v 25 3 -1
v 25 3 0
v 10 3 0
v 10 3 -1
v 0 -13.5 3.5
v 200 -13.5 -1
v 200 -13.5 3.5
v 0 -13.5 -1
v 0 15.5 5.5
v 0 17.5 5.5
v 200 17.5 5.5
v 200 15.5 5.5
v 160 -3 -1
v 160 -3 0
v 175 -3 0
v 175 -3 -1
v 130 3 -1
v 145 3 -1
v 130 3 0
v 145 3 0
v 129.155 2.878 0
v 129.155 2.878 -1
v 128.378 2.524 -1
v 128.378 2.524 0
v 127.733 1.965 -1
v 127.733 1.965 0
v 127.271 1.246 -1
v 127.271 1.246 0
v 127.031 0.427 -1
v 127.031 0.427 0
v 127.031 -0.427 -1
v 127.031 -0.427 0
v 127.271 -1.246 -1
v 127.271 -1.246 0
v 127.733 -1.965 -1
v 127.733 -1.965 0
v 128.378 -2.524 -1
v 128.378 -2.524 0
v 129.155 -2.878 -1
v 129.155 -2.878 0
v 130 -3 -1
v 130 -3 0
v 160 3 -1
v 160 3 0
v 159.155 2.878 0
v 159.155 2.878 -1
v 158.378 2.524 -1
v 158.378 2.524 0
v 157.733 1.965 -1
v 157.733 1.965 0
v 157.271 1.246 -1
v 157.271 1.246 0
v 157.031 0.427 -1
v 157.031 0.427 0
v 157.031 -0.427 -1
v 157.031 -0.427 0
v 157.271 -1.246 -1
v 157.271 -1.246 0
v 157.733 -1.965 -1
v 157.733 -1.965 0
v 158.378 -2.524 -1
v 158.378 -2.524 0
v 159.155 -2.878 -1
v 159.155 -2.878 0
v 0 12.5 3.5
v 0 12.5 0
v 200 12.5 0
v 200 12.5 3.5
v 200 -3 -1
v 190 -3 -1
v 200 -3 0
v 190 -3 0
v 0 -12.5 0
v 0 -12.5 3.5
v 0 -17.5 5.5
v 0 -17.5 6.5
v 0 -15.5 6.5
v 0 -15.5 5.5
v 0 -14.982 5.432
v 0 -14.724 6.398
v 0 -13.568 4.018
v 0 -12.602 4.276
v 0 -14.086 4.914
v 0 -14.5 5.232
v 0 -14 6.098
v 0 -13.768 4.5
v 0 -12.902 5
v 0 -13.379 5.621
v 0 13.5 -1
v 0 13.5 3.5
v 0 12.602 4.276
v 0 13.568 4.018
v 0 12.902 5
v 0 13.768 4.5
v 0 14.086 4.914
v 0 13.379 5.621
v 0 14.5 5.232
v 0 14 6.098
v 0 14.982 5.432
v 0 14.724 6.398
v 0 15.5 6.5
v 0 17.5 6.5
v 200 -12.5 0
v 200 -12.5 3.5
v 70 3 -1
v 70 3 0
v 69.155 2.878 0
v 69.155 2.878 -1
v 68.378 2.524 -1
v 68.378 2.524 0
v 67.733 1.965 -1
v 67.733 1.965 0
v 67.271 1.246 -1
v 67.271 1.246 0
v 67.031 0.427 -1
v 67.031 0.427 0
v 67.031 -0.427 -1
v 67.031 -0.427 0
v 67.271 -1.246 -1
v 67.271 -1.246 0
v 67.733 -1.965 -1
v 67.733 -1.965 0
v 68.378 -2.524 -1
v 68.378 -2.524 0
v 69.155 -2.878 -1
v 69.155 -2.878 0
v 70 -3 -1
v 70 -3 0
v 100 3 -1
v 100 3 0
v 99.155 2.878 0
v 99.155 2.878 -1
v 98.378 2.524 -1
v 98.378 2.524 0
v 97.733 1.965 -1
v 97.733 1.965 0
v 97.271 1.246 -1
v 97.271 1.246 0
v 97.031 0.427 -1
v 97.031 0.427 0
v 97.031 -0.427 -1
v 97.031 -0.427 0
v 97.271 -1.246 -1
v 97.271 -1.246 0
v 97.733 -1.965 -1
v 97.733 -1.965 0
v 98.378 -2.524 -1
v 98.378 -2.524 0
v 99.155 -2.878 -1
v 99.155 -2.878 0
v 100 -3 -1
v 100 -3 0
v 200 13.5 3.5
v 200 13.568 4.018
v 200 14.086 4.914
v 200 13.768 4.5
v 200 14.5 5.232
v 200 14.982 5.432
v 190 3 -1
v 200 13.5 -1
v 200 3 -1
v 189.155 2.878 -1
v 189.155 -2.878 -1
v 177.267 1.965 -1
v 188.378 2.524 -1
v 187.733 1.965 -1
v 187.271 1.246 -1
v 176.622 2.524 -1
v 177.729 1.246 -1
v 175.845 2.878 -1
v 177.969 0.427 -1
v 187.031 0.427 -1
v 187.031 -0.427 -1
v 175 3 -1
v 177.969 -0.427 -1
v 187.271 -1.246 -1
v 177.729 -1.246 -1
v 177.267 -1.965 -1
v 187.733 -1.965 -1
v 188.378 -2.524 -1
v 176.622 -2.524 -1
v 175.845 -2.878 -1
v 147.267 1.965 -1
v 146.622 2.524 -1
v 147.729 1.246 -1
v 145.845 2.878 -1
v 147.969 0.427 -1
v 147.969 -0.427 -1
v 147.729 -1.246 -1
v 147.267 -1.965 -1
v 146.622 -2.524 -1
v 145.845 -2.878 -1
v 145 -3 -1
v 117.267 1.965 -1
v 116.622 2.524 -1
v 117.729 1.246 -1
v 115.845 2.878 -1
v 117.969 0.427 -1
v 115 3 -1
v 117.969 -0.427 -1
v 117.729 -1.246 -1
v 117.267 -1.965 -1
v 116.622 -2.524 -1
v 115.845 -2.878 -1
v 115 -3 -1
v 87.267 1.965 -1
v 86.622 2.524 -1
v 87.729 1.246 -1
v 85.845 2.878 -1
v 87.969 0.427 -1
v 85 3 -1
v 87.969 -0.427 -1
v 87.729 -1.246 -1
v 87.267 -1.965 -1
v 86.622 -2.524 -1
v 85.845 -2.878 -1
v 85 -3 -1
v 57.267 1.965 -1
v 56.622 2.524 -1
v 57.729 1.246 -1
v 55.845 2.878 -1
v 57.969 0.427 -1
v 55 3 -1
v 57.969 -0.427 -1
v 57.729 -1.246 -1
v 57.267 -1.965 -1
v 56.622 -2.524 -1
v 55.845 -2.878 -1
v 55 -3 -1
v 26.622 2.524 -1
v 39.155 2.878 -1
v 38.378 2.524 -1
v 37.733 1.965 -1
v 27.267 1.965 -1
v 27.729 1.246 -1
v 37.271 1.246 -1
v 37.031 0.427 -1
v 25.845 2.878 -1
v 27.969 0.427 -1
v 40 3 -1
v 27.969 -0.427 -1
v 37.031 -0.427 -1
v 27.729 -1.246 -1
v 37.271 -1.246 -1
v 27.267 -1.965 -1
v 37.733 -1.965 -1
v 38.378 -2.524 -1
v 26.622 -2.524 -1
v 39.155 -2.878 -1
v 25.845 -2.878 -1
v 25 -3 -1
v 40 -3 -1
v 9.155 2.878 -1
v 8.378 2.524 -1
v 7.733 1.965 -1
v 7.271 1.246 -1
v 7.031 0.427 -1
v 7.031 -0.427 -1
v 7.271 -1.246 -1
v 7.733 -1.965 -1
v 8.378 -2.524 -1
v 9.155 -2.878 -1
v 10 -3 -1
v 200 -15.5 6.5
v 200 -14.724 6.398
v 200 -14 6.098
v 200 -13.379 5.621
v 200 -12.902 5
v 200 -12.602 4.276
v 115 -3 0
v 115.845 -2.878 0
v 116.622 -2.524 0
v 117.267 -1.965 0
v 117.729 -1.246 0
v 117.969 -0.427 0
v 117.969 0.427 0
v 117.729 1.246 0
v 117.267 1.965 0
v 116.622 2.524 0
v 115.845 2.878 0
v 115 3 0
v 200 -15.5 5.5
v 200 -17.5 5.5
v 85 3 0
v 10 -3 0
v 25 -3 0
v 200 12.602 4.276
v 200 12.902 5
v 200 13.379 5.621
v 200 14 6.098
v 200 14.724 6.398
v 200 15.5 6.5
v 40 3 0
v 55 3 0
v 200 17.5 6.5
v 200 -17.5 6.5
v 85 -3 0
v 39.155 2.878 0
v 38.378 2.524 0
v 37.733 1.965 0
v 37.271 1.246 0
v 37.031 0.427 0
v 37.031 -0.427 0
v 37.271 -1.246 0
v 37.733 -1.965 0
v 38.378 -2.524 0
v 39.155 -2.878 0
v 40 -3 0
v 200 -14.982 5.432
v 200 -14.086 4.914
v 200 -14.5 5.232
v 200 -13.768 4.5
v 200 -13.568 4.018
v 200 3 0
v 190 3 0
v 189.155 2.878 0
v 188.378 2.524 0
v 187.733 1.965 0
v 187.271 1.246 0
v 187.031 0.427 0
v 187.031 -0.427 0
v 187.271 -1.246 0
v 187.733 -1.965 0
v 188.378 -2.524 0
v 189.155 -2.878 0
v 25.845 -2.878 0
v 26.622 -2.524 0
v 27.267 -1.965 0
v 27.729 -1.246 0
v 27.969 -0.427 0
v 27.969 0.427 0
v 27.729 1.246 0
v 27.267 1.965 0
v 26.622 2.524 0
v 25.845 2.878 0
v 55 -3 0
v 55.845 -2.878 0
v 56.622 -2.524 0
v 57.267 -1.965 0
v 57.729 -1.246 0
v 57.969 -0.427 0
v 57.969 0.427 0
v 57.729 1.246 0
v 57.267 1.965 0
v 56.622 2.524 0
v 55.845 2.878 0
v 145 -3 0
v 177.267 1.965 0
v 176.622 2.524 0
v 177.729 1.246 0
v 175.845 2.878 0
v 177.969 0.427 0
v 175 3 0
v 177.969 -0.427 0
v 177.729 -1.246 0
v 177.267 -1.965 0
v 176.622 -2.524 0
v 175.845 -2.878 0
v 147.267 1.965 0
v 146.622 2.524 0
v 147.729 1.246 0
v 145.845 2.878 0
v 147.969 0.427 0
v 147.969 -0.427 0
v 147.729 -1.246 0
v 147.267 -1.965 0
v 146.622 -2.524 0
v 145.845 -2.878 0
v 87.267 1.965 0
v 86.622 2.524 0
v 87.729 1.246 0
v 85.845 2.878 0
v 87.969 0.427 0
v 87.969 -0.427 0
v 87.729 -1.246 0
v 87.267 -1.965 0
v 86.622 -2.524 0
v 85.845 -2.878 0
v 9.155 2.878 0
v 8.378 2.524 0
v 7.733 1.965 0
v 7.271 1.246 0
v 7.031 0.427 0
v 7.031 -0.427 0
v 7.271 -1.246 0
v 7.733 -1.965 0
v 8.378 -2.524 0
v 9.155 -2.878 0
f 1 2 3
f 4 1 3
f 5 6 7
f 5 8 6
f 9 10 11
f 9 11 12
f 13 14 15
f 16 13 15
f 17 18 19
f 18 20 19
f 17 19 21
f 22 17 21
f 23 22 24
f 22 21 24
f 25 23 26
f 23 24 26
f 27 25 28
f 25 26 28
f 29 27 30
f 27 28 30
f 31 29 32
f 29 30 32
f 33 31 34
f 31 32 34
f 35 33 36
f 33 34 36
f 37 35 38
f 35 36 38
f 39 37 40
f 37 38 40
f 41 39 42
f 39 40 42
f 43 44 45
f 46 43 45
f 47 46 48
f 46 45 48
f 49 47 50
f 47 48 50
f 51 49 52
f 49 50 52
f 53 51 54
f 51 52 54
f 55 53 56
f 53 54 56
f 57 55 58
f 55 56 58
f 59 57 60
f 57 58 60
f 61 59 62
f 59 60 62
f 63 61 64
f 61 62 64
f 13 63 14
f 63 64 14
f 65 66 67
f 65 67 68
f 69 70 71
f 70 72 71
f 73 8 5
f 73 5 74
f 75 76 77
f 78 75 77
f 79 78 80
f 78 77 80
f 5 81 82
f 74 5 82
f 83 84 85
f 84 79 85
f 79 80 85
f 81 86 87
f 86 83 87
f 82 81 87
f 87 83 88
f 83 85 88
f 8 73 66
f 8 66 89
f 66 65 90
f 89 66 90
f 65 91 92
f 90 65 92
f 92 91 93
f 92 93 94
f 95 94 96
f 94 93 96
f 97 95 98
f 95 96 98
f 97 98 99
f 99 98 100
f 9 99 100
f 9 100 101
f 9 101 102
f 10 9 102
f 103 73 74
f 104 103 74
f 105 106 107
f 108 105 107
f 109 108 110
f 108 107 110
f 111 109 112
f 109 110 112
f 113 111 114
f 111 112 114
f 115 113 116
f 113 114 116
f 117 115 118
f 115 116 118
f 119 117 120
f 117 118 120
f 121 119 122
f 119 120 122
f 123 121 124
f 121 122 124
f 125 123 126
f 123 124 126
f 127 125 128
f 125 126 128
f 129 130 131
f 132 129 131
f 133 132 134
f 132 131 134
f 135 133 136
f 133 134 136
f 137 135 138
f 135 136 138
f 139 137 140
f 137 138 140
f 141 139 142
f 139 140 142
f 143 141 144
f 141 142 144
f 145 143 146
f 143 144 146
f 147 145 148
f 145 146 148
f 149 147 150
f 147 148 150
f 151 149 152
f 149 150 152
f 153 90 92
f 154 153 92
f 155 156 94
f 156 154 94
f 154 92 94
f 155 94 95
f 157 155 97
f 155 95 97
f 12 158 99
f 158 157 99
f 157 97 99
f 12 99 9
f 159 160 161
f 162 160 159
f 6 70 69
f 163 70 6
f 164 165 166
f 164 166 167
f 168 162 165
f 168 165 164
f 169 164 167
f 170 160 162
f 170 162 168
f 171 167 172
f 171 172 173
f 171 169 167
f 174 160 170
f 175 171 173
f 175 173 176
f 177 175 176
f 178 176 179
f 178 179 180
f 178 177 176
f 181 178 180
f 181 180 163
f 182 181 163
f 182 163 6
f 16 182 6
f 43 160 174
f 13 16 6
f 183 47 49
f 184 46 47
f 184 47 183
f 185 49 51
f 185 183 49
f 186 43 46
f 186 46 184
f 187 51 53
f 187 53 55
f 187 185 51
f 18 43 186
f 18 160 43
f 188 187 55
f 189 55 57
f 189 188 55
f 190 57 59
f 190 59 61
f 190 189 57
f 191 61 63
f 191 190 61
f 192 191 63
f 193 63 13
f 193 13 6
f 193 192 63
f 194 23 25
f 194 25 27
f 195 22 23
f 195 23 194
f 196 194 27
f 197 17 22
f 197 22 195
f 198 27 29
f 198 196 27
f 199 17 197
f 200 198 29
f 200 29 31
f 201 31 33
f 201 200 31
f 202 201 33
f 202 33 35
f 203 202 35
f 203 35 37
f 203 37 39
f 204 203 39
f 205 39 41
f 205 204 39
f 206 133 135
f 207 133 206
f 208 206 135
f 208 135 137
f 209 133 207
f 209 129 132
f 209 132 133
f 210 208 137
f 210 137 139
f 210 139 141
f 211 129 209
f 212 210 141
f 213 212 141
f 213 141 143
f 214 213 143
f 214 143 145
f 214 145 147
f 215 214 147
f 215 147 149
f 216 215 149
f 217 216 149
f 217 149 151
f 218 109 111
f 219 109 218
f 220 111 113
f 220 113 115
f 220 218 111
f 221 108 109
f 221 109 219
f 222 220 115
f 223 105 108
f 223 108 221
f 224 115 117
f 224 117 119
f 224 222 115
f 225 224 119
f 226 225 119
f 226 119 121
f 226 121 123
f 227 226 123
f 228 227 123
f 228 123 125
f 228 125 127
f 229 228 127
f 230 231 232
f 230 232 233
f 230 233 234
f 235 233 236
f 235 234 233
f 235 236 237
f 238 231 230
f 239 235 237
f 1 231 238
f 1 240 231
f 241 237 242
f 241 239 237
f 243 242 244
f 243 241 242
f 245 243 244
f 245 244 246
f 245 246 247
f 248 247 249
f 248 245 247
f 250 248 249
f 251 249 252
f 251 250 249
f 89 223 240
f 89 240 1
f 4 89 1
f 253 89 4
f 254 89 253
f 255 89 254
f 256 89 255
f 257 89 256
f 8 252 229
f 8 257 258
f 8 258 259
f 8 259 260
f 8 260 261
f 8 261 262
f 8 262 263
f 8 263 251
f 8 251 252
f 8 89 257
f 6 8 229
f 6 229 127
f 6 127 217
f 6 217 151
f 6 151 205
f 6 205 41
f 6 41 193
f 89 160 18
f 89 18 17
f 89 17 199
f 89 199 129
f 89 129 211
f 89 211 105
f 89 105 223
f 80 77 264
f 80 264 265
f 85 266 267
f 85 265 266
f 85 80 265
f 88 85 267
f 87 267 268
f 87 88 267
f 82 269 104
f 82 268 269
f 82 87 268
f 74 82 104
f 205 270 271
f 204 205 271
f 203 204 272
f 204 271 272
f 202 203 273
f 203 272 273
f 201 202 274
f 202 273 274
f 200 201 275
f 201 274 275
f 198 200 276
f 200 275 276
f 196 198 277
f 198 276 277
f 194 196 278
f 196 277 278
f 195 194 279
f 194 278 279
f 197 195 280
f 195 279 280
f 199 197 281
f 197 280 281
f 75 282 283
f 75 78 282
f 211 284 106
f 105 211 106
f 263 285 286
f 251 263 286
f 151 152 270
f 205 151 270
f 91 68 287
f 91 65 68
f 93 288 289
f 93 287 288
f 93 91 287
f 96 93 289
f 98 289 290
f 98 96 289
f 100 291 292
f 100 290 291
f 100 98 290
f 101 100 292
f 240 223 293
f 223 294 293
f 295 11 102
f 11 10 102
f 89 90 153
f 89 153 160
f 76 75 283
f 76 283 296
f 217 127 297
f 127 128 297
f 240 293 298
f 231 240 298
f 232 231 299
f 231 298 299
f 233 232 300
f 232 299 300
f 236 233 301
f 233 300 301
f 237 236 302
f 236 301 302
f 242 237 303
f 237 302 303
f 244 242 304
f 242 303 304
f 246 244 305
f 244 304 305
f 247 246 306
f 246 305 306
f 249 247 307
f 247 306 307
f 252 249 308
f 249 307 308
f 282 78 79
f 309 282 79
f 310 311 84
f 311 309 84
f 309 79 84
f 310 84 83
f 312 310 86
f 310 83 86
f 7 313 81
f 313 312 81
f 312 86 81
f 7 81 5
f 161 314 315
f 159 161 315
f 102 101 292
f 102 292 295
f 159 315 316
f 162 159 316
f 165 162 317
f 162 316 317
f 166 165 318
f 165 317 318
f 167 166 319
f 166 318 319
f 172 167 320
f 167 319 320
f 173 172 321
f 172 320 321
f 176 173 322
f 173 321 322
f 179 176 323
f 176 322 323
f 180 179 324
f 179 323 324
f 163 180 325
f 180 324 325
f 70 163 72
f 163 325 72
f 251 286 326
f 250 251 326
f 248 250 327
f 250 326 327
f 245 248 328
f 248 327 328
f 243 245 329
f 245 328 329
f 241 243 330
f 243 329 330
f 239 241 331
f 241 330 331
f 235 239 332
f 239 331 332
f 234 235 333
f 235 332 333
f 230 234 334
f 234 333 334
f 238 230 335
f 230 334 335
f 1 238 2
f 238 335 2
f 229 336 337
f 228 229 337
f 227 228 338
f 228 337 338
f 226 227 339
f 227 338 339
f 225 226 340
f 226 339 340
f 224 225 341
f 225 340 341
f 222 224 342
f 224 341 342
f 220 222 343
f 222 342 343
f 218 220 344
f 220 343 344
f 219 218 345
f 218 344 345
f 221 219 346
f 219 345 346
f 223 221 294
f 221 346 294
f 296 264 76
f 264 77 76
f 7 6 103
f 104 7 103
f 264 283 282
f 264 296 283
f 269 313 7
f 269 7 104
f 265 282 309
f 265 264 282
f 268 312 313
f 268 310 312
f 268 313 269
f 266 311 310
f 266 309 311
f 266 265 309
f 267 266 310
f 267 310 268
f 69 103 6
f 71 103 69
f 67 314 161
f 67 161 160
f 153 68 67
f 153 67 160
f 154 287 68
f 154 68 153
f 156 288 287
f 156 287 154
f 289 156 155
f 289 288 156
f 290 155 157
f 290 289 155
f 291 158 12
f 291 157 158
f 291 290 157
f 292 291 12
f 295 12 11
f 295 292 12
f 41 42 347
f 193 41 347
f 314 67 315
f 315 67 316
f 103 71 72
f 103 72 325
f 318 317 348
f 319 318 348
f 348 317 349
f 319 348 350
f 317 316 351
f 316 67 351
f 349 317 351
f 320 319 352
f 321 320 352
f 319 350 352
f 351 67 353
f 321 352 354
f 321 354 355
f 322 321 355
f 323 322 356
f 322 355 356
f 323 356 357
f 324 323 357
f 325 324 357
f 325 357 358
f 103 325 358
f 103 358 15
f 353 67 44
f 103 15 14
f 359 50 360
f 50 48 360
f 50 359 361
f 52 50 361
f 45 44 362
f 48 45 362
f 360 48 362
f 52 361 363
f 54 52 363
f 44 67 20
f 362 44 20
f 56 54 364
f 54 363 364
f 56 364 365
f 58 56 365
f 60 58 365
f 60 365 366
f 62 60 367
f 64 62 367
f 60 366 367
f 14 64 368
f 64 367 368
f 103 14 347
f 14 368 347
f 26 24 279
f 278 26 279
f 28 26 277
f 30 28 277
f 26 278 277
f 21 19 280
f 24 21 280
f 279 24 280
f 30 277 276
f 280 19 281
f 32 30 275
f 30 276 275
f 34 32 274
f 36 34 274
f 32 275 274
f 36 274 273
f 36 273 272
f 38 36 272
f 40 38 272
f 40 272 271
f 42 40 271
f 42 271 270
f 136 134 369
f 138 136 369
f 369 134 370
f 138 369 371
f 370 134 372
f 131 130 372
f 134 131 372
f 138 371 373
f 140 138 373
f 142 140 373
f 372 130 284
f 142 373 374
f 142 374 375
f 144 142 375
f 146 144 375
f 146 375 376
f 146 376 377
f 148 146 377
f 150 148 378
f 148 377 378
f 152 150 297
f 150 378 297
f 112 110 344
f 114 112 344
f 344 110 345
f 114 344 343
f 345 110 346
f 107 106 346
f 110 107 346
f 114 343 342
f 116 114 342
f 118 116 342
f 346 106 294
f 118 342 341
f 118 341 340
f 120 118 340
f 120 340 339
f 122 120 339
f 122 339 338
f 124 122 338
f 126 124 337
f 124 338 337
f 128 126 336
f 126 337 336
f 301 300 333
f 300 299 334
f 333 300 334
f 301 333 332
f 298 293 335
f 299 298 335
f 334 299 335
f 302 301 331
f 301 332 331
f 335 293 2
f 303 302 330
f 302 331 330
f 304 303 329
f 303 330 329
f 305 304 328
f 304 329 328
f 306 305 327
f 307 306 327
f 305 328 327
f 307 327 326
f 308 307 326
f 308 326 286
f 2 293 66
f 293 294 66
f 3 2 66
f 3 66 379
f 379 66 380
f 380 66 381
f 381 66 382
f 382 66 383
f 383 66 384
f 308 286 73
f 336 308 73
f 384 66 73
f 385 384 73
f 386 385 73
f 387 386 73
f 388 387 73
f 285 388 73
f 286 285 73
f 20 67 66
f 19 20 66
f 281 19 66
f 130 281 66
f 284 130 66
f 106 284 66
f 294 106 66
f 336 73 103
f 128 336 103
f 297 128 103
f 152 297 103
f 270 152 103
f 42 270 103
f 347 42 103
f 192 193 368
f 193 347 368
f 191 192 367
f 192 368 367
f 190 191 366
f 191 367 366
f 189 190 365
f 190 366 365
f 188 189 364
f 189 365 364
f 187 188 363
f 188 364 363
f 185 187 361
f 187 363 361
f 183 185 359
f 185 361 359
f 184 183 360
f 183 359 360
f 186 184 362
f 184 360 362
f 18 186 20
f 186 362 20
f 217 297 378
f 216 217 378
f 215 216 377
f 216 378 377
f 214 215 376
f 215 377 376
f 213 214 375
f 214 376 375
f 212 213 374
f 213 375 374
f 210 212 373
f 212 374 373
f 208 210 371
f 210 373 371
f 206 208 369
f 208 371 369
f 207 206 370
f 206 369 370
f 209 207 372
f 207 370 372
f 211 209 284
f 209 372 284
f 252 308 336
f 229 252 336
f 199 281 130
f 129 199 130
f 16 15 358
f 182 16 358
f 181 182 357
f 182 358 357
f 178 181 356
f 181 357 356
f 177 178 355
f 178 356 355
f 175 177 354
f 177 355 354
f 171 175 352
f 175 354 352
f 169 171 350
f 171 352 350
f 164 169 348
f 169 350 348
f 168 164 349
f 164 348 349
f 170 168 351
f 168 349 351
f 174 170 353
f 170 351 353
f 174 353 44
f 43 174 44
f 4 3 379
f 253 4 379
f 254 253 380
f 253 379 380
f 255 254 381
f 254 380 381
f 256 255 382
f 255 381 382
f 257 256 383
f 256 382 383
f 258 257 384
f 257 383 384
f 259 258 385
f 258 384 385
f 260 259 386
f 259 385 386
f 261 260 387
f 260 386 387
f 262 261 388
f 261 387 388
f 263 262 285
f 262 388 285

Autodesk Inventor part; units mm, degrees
ref_plane "YZ Plane" through (0, 0, 0) normal (1, 0, 0) x (0, 1, 0)
ref_plane "XZ Plane" through (0, 0, 0) normal (0, 1, 0) x (-1, 0, 0)
ref_plane "XY Plane" through (0, 0, 0) normal (0, 0, 1) x (1, 0, 0)
sketch "Sketch1" plane through (0, 0, 0) normal (1, 0, 0) x (0, 1, 0)
  line L0 (12.5, 0) -> (-12.5, 0)
  line L1 (12.5, 0) -> (12.5, 3.5)
  line L2 (15.5, 6.5) -> (17.5, 6.5)
  line L3 (-12.5, 0) -> (-12.5, 3.5)
  line L4 (-15.5, 6.5) -> (-17.5, 6.5)
  line L5 (17.5, 5.5) -> (15.5, 5.5)
  line L6 (13.5, 3.5) -> (13.5, -1)
  line L7 (13.5, -1) -> (-13.5, -1)
  line L8 (-13.5, -1) -> (-13.5, 3.5)
  line L9 (-15.5, 5.5) -> (-17.5, 5.5)
  line L10 (17.5, 5.5) -> (17.5, 6.5)
  line L11 (-17.5, 5.5) -> (-17.5, 6.5)
  arc A0 (15.5, 5.5) -> (13.5, 3.5) centre (15.5, 3.5) ccw
  arc A1 (15.5, 6.5) -> (12.5, 3.5) centre (15.5, 3.5) ccw
  arc A2 (-12.5, 3.5) -> (-15.5, 6.5) centre (-15.5, 3.5) ccw
  arc A3 (-13.5, 3.5) -> (-15.5, 5.5) centre (-15.5, 3.5) ccw
  point P0 (0, 0)
  point P1 (0, 0)
  dimension "d0" = 25
  dimension "d2" = 1
  dimension "d3" = 35
  dimension "d4" = 2
  dimension "d5" = 2
  dimension "d6" = 7.5
extrude "Extrusion1" add sketch "Sketch1" along normal blind 200
sketch "Sketch2" plane through (0, -12.5, 0) normal (0, 0, 1) x (1, 0, 0)
  line L0 (10, 12.5) -> (25, 12.5) construction
  line L1 (10, 9.5) -> (25, 9.5)
  line L2 (25, 15.5) -> (10, 15.5)
  arc A0 (10, 15.5) -> (10, 9.5) centre (10, 12.5) ccw
  arc A1 (25, 9.5) -> (25, 15.5) centre (25, 12.5) ccw
  line L3 (0, 25) -> (0, 0) projected
  point P0 (0, 12.5)
  point P1 (17.5, 12.5)
  point P2 (0, 12.5)
  dimension "d9" = 15
  dimension "d10" = 6
  dimension "d11" = 10
extrude "Extrusion2" cut sketch "Sketch2" against normal through all
pattern_linear "Rectangular Pattern1" count 10 spacing 30 along (1, 0, 0) of "Extrusion2"
equation "\"d12\" = d9"
properties part number "din_rail" material "Aluminum 6061"
